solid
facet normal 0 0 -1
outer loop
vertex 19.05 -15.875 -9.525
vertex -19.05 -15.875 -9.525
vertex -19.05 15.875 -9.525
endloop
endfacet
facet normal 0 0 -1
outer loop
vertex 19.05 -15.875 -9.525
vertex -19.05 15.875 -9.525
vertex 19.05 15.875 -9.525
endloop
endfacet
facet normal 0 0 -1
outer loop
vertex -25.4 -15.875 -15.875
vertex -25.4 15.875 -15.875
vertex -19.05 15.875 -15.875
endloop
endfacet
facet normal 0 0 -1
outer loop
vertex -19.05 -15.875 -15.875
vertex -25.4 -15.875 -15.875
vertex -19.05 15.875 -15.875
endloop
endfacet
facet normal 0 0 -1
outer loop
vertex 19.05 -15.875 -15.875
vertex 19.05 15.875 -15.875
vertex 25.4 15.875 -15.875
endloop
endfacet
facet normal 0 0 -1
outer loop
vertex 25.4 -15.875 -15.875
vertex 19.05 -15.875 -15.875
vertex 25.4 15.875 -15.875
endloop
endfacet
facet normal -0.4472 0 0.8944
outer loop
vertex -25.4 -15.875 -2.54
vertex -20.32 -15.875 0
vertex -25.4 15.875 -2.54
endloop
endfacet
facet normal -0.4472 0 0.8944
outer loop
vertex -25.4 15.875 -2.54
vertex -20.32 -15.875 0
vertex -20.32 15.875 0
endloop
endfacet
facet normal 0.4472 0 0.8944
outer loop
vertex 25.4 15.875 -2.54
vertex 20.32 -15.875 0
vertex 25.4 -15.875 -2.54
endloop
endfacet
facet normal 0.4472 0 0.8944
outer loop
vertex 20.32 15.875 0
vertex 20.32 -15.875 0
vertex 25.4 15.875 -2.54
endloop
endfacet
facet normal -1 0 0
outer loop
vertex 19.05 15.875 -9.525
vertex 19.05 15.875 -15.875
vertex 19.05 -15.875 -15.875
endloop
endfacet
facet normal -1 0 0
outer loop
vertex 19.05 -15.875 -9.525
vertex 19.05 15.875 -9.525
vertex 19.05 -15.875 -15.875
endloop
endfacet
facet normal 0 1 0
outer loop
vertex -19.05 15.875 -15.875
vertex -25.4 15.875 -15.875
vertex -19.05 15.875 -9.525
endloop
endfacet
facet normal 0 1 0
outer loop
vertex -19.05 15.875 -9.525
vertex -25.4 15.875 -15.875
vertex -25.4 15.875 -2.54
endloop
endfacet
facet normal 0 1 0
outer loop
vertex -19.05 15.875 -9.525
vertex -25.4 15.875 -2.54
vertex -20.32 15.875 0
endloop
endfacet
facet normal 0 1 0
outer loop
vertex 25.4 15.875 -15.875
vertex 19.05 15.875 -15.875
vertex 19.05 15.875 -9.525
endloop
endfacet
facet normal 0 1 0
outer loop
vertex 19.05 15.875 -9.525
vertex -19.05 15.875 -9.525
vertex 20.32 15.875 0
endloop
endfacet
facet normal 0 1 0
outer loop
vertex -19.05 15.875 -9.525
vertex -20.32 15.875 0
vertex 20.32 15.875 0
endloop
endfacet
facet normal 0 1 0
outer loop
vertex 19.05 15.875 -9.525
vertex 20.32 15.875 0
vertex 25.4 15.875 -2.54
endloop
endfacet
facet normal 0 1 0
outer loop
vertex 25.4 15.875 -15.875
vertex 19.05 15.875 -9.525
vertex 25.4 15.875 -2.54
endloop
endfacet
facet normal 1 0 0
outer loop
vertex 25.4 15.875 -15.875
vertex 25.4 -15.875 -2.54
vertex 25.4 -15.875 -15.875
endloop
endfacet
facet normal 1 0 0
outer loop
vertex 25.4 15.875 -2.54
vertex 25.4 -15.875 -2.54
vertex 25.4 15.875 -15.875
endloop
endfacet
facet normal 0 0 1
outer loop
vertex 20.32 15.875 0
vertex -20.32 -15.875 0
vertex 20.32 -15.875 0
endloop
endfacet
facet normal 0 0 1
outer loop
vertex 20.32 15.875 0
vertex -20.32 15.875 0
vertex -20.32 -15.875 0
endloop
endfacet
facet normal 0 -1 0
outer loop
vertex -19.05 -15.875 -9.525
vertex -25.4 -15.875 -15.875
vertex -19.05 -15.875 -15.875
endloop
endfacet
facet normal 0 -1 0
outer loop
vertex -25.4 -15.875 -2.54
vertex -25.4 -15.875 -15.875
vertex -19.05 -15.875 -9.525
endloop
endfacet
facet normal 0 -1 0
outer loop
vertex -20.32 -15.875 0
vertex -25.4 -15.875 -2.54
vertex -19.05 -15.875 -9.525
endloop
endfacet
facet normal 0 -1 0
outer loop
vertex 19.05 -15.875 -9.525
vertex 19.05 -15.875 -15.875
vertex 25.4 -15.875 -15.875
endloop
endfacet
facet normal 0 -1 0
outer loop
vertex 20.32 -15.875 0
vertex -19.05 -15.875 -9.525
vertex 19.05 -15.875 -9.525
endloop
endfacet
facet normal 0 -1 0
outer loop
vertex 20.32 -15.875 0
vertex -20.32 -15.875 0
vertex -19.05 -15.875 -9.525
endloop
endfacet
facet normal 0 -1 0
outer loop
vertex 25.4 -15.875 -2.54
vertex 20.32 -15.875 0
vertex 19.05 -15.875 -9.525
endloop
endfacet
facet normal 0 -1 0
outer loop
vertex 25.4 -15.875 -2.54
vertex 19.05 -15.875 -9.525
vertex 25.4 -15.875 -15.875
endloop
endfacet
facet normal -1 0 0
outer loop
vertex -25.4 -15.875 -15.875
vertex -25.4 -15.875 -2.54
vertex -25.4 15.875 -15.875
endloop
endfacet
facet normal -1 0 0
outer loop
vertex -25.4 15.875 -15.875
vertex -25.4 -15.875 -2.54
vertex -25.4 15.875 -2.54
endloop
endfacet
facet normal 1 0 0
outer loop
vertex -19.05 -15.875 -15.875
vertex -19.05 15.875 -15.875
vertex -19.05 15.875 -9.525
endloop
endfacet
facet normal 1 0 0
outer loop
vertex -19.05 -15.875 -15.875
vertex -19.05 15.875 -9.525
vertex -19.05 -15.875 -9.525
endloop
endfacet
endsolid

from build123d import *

# Parameters (mm, degrees)
F0_W       = 50.8
F0_H       = 31.75
F1_DEPTH   = 15.875
F2_W       = 38.1
F2_H       = 31.75
F3_DEPTH   = 6.35
F4_SIZE2   = 5.08
F4_SIZE    = 2.54
F4_2_SIZE2 = 5.08
F4_2_SIZE  = 2.54


with BuildPart() as f1:
    # F0 (on Top) → F1 (new body)
    with BuildSketch(Plane.XY):
        Rectangle(F0_W, F0_H)
    extrude(amount=-F1_DEPTH)

    # F2 (on face) → F3 (cut)
    with BuildSketch(Plane(origin=(0, 0, -15.875), x_dir=(1, 0, 0), z_dir=(0, 0, -1))):
        Rectangle(F2_W, F2_H)
    extrude(amount=-F3_DEPTH, mode=Mode.SUBTRACT)

    # F4
    f4_edges = [f1.edges().sort_by_distance(p)[0] for p in [
        (-25.4, 0, 0),
    ]]
    f4_side = f1.faces().sort_by_distance((-25.4, 0, -7.9375))[0]
    chamfer(f4_edges, length=F4_SIZE, length2=F4_SIZE2, reference=f4_side)

    # F4#2
    f4_2_edges = [f1.edges().sort_by_distance(p)[0] for p in [
        (25.4, 0, 0),
    ]]
    f4_2_side = f1.faces().sort_by_distance((25.4, 0, -7.9375))[0]
    chamfer(f4_2_edges, length=F4_2_SIZE, length2=F4_2_SIZE2, reference=f4_2_side)


solid = f1.part
